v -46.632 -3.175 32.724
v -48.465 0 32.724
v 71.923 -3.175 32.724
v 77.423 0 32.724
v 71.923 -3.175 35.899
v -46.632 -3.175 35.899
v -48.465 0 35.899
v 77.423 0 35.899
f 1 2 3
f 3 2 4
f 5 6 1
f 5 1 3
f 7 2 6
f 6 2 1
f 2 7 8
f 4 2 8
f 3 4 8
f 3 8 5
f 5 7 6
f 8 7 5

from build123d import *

# Parameters (mm, degrees)
F0_W        = 127
F0_H        = 3.175
F1_DEPTH    = 3.175
F2_T1_DEPTH = 23.6619672735
F3_T1_DEPTH = 35.0436157588


# Not quite as in the source:
# - a fillet or chamfer that OpenCascade refuses, or shapes differently, is made with other operations: its cross-section is extruded or revolved along the edge and cut away or added


with BuildPart() as f1:
    # F0 (on Front) → F1 (new body)
    with BuildSketch(Plane.XZ):
        with Locations((14.5824663341, 34.311569615)):
            Rectangle(F0_W, F0_H)
    extrude(amount=F1_DEPTH)

    # F2: chamfer of 2.286 x 3.9594681461 on 1 edges, made by hand

    # F2_s2 → F2_t1 (cut)
    with BuildSketch(Plane.XY.offset(22.4805859783)):
        Polygon((-48.9175336659, 0.7844681461), (-46.6315336659, -3.175), (-48.9175336659, -3.175), align=None)
    extrude(amount=F2_T1_DEPTH, mode=Mode.SUBTRACT)

    # F3: chamfer of 3.556 x 6.1591726717 on 1 edges, made by hand

    # F3_s2 → F3_t1 (cut)
    with BuildSketch(Plane.XY.offset(16.7897617356)):
        Polygon((78.0824663341, 0.381), (71.9232936624, -3.175), (78.0824663341, -3.175), align=None)
    extrude(amount=F3_T1_DEPTH, mode=Mode.SUBTRACT)


solid = f1.part
